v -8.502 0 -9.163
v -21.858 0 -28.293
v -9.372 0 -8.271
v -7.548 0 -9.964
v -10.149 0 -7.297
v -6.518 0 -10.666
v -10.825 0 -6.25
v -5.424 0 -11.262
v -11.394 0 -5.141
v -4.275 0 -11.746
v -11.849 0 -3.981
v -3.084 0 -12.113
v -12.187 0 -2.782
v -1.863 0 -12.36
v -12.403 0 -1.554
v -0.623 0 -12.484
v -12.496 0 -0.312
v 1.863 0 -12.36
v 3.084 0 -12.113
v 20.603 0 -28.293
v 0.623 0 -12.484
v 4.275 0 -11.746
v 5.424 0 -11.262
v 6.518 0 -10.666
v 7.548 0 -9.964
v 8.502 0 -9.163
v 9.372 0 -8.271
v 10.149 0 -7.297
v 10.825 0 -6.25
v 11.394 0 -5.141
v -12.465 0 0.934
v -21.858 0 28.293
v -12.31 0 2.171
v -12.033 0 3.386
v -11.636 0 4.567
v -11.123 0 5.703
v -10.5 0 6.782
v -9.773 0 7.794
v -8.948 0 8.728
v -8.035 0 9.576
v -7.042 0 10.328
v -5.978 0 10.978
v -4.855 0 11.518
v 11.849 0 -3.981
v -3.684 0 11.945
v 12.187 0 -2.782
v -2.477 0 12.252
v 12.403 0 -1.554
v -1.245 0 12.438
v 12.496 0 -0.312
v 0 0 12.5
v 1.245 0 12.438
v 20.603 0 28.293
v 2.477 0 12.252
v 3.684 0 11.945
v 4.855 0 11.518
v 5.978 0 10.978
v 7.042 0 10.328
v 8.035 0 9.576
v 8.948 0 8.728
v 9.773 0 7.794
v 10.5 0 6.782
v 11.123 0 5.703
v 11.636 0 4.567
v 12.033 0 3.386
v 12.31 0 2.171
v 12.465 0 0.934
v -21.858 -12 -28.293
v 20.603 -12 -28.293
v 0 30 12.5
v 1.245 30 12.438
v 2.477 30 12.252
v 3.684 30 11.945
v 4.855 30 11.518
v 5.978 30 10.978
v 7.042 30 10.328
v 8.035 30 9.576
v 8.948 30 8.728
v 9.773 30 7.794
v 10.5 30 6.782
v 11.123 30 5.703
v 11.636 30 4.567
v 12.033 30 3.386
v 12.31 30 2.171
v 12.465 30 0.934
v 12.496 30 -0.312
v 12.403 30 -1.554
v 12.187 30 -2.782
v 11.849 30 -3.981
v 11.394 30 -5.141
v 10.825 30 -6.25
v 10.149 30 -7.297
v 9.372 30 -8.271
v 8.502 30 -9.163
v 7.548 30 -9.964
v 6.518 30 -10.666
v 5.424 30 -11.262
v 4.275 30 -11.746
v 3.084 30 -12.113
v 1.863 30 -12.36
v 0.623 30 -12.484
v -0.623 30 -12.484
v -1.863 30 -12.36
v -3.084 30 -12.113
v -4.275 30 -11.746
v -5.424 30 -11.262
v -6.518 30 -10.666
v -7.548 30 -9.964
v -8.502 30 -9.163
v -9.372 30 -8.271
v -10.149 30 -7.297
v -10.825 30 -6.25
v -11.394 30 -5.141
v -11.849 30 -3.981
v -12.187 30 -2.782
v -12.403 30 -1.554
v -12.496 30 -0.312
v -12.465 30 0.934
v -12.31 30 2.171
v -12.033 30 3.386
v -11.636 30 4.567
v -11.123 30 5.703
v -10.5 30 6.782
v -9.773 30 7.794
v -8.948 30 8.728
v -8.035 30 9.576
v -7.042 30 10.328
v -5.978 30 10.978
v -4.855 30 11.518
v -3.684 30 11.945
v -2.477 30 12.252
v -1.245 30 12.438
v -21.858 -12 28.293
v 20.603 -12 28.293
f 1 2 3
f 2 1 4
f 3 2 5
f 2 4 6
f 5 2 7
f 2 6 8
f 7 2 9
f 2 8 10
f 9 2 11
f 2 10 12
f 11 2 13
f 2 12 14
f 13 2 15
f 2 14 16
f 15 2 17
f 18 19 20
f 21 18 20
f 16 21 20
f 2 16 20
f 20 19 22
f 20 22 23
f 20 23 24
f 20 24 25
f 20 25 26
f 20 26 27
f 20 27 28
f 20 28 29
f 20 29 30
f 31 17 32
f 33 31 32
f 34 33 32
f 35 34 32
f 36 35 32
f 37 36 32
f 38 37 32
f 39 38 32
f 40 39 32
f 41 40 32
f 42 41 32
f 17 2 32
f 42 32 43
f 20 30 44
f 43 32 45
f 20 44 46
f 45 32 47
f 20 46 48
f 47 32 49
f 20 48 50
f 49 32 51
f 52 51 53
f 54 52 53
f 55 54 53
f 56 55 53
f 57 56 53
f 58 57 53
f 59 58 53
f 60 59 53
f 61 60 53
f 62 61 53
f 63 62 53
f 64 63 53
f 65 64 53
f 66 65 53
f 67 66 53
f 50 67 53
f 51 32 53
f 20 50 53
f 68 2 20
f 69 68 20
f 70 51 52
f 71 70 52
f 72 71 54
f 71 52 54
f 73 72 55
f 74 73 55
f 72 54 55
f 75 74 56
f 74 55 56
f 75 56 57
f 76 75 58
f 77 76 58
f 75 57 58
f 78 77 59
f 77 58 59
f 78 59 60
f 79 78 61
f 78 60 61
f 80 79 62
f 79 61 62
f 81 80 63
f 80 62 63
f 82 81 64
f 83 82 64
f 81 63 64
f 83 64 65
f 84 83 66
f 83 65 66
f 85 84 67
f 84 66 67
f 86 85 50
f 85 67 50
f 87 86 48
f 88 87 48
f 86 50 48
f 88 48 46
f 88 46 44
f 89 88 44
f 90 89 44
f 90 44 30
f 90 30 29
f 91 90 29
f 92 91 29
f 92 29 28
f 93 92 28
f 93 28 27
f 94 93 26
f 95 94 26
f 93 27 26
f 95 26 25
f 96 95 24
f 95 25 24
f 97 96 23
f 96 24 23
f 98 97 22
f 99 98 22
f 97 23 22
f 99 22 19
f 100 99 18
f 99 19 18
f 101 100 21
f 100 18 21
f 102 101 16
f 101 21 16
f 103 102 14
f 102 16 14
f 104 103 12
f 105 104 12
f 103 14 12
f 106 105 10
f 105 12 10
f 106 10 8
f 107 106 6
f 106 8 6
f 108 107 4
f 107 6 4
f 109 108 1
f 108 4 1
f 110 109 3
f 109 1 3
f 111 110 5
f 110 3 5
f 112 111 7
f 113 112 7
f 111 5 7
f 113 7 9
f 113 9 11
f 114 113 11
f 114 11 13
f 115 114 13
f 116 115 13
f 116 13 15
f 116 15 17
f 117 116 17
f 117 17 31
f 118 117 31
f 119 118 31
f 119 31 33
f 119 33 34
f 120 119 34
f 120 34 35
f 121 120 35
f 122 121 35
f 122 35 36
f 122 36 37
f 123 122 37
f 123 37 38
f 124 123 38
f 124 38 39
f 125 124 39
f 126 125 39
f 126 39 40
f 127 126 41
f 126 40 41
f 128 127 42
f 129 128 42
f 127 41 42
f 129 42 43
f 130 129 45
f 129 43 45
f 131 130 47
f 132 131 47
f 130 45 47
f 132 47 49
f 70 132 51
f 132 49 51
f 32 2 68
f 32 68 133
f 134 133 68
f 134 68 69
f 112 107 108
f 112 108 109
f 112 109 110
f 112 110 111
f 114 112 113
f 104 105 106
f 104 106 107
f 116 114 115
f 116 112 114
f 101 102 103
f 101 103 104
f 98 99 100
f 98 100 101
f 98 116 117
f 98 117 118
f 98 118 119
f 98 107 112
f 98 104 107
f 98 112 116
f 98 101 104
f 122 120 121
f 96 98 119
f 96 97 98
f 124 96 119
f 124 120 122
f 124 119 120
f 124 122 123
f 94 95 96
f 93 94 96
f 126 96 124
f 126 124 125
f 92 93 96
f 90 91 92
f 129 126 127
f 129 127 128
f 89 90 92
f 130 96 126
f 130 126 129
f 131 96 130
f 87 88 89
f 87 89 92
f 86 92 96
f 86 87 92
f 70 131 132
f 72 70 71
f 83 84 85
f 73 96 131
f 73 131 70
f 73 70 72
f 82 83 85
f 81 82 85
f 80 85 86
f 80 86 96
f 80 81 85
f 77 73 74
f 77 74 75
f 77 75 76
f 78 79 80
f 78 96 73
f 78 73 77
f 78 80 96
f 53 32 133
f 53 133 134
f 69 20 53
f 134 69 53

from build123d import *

# Parameters (mm, degrees)
SKETCH_1_R      = 12.5
EXTRUDE_1_DEPTH = 30
SKETCH_2_W      = 42.461745146
SKETCH_2_H      = 56.586214178
EXTRUDE_2_DEPTH = 12


with BuildPart() as part:
    # Эскиз1 → Вытянуть1 (new body)
    with BuildSketch(Plane(origin=(0, 0, 0), x_dir=(1, 0, 0), z_dir=(0, 1, 0))):
        with Locations(Location((0, 0, 0), (0, 0, 270))):
            Circle(SKETCH_1_R)
    extrude(amount=EXTRUDE_1_DEPTH)

    # Эскиз2 → Вытянуть2 (add)
    with BuildSketch(Plane.XZ):
        with Locations((-0.627472581, 0)):
            Rectangle(SKETCH_2_W, SKETCH_2_H)
    extrude(amount=EXTRUDE_2_DEPTH)


solid = part.part
